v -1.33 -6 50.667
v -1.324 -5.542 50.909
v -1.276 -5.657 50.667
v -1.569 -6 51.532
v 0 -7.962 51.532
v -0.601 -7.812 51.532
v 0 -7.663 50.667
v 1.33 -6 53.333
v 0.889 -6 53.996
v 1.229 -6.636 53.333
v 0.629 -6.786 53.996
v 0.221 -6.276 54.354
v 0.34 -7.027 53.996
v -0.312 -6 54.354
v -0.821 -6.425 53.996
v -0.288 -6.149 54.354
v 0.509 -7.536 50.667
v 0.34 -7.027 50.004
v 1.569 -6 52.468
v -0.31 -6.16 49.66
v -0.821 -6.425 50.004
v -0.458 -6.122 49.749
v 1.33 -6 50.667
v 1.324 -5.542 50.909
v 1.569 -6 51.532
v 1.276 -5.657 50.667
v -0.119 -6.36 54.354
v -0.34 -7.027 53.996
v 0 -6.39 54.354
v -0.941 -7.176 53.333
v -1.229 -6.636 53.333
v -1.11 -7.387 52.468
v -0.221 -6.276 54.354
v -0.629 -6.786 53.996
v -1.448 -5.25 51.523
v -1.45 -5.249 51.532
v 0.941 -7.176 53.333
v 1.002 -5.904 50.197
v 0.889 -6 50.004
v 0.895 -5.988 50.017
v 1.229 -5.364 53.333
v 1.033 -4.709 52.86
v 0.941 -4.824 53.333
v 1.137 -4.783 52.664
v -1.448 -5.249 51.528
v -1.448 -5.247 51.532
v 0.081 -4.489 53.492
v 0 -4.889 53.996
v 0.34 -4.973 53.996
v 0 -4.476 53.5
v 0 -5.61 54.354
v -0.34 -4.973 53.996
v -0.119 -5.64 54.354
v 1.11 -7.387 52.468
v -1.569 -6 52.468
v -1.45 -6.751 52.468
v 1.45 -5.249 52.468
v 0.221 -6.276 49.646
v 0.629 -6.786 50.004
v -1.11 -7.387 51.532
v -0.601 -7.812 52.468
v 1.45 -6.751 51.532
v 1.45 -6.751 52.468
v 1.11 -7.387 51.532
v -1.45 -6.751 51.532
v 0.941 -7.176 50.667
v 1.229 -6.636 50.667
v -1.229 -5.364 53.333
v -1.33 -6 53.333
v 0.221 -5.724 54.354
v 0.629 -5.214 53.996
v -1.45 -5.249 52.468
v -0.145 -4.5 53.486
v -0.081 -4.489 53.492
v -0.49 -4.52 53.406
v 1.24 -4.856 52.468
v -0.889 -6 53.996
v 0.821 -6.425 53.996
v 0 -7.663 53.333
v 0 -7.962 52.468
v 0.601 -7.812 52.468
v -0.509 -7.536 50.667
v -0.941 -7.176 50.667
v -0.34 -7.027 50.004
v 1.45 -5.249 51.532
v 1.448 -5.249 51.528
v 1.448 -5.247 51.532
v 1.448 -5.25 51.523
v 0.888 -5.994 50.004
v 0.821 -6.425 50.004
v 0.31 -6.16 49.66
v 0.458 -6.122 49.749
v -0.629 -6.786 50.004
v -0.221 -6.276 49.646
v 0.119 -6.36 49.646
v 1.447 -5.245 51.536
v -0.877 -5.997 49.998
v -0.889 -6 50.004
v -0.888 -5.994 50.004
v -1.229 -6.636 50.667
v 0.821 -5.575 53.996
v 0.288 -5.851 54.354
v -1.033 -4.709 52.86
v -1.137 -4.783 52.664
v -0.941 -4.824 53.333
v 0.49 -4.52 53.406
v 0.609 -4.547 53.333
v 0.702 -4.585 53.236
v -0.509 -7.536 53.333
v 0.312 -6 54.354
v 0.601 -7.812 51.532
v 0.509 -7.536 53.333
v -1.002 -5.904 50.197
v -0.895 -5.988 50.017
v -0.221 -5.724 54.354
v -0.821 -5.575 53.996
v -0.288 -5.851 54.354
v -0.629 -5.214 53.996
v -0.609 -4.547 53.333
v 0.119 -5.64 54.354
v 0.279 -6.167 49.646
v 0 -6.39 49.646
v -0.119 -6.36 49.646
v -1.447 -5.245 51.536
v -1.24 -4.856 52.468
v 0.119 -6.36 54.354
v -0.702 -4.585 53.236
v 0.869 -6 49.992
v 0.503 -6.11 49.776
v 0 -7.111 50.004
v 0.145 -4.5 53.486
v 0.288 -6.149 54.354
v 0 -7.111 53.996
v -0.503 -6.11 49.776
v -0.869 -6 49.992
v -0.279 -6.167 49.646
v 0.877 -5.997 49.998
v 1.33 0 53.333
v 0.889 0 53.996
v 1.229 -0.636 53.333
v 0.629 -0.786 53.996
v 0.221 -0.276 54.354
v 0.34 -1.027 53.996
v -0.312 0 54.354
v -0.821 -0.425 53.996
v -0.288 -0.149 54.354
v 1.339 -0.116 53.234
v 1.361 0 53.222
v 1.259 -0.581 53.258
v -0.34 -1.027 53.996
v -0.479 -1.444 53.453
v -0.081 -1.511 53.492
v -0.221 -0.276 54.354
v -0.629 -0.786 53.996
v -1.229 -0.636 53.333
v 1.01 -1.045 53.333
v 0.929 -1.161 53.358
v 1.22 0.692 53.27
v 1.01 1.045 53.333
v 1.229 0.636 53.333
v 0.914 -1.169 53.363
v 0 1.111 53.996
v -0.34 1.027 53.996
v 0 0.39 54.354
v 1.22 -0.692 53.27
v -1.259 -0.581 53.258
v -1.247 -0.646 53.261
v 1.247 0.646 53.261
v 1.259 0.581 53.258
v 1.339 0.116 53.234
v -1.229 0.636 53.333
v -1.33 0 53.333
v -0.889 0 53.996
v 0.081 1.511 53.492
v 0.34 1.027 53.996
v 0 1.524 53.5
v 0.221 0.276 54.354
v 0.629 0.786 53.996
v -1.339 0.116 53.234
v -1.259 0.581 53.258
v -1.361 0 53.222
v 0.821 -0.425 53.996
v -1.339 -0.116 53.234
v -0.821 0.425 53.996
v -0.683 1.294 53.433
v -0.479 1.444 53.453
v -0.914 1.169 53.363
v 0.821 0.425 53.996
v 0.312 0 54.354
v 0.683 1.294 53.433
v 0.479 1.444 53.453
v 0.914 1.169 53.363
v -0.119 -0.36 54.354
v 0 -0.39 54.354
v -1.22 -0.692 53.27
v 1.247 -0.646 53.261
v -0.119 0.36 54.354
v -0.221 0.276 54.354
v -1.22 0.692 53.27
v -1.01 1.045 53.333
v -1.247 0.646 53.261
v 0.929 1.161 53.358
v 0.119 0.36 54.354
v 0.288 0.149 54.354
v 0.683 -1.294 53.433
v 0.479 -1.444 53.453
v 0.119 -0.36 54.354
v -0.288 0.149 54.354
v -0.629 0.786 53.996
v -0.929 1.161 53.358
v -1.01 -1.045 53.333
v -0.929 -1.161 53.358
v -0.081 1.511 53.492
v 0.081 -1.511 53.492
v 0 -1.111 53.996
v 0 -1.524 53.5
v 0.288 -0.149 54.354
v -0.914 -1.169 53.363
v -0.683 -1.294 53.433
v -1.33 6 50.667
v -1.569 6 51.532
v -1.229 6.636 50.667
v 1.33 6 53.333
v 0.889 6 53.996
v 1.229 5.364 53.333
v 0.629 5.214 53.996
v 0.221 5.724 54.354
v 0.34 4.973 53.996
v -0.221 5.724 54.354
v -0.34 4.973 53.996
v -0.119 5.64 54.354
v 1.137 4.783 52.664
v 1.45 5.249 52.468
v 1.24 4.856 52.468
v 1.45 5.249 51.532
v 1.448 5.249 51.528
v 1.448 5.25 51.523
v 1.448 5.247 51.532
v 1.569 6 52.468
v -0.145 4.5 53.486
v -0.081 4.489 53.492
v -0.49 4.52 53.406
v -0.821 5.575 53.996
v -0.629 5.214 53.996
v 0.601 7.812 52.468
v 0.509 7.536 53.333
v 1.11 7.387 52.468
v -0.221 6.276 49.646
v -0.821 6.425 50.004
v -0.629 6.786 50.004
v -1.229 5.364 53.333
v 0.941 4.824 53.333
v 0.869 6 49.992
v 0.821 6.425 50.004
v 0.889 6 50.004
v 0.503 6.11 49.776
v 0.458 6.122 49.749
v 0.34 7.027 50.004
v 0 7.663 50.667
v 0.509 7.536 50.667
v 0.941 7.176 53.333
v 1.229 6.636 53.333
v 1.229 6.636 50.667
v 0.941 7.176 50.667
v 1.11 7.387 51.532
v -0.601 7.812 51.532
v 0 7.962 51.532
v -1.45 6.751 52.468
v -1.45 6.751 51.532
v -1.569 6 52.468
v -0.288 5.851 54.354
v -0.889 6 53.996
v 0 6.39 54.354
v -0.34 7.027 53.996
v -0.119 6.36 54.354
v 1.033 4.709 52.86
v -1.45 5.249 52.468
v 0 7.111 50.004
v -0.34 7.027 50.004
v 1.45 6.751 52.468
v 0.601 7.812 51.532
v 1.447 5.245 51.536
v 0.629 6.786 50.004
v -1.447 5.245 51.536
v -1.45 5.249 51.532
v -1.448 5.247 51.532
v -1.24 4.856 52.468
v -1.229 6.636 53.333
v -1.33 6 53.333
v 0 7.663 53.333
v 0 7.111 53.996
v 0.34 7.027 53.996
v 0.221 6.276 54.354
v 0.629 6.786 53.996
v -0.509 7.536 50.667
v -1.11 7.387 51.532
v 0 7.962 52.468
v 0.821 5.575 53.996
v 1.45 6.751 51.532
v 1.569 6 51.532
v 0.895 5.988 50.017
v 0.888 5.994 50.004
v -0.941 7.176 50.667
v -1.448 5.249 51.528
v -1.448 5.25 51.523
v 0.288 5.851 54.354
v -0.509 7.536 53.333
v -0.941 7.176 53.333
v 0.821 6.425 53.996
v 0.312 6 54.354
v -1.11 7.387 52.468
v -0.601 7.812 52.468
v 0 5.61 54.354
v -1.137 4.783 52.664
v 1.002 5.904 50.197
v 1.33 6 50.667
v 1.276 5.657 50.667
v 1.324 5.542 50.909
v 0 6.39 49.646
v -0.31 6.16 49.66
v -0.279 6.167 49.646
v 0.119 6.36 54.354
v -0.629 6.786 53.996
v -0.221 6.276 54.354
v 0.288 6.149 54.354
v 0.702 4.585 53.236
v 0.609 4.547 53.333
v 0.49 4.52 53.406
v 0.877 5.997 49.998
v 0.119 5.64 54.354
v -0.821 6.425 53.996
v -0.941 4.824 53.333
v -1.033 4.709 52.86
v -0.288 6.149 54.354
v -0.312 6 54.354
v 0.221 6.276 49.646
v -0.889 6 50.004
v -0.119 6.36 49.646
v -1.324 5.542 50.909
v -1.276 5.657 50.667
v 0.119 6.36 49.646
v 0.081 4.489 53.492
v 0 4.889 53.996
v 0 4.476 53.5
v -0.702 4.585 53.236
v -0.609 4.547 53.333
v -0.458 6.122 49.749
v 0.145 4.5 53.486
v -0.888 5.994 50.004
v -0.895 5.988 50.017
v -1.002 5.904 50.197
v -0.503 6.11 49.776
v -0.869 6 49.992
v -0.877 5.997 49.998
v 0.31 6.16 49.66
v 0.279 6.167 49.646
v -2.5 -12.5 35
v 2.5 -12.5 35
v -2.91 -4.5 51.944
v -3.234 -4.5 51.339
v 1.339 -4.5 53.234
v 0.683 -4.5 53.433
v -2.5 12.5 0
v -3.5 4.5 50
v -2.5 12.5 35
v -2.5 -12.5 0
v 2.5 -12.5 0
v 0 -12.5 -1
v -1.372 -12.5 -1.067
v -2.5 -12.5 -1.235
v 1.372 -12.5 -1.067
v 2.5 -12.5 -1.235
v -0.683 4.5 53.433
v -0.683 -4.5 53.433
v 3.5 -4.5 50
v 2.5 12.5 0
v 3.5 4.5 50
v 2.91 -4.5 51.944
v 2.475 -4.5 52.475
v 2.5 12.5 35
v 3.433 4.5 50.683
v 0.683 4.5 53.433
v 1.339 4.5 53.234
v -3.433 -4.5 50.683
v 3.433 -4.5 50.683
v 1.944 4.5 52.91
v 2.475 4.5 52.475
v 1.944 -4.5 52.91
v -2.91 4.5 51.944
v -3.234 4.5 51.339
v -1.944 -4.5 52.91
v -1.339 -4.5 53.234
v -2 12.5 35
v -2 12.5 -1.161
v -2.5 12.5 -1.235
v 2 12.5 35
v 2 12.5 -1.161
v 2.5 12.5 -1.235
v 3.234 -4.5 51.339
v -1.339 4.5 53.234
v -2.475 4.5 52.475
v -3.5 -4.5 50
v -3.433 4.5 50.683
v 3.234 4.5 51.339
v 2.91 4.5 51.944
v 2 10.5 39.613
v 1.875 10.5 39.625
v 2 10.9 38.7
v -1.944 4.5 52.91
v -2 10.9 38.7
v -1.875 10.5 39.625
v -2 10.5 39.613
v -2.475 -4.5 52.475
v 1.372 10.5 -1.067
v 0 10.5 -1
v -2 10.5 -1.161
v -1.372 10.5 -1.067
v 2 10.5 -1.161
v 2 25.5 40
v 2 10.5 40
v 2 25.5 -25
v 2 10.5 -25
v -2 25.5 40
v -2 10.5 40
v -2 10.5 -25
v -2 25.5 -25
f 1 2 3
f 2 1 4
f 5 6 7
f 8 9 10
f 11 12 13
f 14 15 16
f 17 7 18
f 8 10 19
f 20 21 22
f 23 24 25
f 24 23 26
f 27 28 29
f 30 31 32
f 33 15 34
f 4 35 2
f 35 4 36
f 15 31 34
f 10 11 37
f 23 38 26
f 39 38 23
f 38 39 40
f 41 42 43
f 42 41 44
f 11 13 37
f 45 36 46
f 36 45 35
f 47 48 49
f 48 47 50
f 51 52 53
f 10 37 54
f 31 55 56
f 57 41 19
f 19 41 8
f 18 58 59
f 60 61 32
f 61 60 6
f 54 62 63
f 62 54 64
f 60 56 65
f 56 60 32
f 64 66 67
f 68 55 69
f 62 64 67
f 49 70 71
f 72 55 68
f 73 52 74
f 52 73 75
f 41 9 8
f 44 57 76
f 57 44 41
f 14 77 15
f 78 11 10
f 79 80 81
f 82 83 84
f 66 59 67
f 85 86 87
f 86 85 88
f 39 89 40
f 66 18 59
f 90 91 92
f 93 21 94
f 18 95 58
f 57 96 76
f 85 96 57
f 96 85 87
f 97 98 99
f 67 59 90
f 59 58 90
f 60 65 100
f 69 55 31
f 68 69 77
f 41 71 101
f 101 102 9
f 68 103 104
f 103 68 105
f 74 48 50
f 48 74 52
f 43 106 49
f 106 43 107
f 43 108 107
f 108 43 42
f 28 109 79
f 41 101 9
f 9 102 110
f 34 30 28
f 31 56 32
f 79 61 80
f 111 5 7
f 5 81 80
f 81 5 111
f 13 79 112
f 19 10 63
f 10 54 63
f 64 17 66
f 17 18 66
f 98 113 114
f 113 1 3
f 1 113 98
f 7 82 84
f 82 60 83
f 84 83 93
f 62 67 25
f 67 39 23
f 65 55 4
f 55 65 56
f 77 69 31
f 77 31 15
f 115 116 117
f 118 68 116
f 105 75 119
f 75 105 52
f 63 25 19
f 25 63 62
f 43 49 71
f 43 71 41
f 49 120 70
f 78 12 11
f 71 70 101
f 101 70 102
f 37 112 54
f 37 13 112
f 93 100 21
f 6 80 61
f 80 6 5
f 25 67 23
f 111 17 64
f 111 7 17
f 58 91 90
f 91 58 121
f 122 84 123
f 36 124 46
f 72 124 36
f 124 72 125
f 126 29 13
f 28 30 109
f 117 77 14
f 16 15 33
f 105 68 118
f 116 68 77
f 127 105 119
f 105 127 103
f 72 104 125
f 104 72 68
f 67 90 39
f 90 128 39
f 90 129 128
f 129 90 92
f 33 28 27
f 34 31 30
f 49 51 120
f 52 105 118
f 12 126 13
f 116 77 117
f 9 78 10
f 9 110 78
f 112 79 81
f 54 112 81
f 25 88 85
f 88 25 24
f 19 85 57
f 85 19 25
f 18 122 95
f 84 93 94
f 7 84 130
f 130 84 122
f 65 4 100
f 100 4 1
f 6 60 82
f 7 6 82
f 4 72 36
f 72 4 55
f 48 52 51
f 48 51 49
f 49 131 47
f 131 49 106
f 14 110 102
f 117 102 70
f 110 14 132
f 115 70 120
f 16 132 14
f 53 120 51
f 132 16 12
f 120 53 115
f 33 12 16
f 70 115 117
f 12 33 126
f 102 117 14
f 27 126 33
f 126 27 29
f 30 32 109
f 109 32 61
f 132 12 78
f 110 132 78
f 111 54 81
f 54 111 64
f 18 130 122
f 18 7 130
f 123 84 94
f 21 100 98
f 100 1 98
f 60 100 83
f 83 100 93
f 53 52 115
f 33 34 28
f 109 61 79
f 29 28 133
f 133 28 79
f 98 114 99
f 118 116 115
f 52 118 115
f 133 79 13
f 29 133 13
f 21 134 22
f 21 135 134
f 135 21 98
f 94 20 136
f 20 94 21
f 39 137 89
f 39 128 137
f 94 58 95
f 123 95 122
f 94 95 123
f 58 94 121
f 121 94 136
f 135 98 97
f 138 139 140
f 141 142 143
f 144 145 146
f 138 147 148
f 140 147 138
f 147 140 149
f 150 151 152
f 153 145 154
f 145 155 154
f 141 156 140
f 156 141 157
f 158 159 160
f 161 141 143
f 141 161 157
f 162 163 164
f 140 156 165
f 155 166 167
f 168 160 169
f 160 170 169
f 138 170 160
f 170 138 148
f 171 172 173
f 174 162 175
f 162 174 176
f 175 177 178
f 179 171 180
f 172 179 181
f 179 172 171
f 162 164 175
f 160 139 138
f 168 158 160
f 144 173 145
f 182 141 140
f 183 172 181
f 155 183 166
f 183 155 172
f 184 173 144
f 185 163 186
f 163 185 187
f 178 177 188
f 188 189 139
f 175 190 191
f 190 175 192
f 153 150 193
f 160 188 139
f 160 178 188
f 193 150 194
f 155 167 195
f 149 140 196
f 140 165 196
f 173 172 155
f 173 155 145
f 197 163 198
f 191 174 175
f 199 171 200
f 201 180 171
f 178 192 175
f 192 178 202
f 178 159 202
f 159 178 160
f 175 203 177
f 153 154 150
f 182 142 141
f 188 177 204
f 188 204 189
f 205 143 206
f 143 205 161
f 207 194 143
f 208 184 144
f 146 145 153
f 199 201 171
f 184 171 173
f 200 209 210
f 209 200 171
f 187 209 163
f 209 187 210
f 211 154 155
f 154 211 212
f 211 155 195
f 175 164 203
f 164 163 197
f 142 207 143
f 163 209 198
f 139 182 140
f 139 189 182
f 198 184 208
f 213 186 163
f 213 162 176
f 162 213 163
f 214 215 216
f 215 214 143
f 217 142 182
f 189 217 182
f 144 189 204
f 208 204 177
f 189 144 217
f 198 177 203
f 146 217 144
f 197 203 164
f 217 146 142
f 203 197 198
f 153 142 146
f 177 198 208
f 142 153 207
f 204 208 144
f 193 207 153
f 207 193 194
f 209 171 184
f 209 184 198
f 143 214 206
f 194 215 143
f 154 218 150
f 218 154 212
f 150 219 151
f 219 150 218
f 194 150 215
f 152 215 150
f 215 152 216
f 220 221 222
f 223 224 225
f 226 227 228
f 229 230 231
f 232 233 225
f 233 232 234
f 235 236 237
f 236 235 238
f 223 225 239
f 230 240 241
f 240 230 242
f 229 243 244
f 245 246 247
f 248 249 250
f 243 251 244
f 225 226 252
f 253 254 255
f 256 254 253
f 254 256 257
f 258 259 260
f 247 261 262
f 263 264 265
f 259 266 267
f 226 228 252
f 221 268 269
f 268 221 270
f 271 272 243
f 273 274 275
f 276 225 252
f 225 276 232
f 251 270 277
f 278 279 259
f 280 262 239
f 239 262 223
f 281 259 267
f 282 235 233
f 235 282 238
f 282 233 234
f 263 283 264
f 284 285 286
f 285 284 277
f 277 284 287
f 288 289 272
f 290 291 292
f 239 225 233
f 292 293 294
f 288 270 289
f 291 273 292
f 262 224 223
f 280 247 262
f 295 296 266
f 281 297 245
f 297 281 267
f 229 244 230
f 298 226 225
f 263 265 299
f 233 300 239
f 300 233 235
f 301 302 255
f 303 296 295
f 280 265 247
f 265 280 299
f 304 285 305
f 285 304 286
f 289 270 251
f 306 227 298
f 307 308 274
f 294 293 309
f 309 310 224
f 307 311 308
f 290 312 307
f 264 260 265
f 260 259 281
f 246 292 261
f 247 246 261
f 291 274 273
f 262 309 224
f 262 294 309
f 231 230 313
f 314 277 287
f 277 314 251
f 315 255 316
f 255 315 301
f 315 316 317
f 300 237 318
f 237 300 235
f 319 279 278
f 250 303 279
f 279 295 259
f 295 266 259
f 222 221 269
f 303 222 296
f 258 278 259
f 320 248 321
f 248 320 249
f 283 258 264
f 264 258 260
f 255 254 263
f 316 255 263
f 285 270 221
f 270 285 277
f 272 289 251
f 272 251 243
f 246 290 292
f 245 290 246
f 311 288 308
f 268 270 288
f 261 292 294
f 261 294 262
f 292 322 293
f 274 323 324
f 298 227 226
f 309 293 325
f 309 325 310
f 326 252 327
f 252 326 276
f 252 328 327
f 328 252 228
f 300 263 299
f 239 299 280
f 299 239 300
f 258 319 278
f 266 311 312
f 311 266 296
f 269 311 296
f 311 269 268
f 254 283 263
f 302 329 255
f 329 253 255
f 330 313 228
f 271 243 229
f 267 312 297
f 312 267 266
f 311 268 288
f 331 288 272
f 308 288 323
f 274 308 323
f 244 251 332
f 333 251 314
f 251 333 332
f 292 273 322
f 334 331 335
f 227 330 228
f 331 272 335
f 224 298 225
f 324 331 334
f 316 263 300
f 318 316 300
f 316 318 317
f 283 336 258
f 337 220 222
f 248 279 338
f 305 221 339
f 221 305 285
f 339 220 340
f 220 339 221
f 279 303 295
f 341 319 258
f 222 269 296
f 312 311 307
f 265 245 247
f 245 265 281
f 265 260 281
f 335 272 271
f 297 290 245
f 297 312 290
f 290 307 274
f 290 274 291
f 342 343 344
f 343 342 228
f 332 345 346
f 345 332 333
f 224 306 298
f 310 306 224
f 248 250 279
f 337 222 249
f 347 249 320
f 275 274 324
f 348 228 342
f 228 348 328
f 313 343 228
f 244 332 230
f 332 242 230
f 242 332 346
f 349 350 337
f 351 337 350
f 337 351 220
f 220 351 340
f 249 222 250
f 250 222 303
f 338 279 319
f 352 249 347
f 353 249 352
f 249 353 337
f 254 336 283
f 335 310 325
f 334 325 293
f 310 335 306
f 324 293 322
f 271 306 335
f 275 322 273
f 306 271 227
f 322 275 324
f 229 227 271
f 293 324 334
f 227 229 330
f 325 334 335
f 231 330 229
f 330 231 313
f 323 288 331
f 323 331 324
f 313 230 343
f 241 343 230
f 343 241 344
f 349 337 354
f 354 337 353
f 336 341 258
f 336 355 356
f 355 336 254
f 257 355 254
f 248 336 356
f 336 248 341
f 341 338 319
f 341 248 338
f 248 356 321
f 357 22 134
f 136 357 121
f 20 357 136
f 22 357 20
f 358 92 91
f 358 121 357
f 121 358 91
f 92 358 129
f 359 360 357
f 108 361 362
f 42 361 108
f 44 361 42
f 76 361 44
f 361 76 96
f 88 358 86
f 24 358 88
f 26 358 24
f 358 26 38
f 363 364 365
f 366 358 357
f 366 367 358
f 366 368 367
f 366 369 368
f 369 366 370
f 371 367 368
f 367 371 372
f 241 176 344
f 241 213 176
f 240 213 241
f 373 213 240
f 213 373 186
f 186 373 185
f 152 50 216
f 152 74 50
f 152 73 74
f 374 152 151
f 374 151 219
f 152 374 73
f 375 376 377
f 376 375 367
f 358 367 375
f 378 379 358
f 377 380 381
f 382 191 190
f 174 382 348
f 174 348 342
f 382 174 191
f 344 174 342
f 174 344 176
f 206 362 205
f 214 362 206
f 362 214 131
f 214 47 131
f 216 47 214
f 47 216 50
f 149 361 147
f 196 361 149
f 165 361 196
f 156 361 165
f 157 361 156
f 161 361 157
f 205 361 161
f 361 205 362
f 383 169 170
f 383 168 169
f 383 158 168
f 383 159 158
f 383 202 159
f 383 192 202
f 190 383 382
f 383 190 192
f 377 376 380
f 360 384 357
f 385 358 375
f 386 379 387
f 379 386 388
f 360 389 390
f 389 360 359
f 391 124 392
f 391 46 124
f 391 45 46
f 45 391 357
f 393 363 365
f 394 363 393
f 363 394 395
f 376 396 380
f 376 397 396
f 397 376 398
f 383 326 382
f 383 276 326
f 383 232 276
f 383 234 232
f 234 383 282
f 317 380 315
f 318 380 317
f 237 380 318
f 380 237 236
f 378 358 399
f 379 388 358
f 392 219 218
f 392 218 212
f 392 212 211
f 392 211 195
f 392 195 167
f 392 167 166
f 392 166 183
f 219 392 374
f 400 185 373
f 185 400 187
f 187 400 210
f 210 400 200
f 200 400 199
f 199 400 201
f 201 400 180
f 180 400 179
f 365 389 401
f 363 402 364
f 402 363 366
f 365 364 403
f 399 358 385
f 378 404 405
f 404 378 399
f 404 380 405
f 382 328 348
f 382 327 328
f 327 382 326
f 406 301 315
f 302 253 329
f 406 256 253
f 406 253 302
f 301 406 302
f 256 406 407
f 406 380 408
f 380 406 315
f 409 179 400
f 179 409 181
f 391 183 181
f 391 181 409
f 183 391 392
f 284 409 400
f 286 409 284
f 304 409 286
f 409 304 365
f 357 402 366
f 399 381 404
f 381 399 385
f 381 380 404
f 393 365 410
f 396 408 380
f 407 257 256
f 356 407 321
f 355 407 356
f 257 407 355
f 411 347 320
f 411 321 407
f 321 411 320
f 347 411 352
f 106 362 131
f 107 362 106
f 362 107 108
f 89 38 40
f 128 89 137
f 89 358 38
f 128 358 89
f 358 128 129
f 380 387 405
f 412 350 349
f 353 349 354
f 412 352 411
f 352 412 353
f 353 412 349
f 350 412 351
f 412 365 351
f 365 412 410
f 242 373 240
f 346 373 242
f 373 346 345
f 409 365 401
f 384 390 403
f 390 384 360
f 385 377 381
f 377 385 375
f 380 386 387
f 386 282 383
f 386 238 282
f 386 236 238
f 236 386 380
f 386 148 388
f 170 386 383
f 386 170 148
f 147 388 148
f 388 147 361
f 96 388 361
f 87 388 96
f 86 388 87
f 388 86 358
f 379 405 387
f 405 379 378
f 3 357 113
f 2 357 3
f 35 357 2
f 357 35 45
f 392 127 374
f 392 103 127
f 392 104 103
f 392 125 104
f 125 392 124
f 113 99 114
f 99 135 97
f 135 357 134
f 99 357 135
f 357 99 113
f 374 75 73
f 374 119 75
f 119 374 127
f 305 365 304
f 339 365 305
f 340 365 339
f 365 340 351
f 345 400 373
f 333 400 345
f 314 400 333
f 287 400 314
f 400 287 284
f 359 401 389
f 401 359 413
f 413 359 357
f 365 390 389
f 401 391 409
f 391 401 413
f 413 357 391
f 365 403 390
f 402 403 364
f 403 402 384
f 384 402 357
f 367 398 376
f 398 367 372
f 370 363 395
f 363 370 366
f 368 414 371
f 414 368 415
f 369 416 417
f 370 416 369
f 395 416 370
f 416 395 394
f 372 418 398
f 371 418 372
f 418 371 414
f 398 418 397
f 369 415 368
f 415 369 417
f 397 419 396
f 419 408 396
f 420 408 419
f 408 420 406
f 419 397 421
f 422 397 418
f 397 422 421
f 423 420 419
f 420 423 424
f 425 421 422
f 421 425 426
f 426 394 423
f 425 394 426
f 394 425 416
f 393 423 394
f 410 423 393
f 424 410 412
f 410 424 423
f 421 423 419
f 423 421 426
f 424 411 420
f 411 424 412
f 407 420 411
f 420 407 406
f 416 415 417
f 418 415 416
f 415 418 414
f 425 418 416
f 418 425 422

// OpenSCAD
// file: common.scad
/*
 * WAVE OCEAN V10 - VERTICAL SLAT SYSTEM
 * COMMON PARAMETERS
 *
 * Three slat designs: Standard (A), Foam (B), Breaking Curl (C)
 * Structural backplate with vertical grooves
 * No front guide rails - clean viewer POV
 */

// ============================================
// PRINT TOLERANCES
// ============================================

TOL_CLEARANCE = 0.2;
TOL_SLIDING = 0.3;
TOL_PRESS_FIT = -0.15;

// ============================================
// HARDWARE
// ============================================

BEARING_608_ID = 8;
BEARING_608_OD = 22;
BEARING_608_H = 7;

SHAFT_DIA = 8;
SHAFT_LENGTH = 260;

M3_HOLE = 3.2;
M4_HOLE = 4.2;

// ============================================
// TWISTED CAM DIMENSIONS
// ============================================

CAM_LENGTH = 200;
CAM_CORE_RADIUS = 12;
CAM_RIDGE_HEIGHT = 12;           // Wave amplitude
CAM_MAX_RADIUS = CAM_CORE_RADIUS + CAM_RIDGE_HEIGHT;  // 24mm

HELIX_TURNS = 2;
HELIX_PITCH = CAM_LENGTH / HELIX_TURNS;

// ============================================
// SLAT COMMON DIMENSIONS
// ============================================

NUM_SLATS = 24;
SLAT_SPACING = CAM_LENGTH / NUM_SLATS;  // 8.33mm

SLAT_THICKNESS = 5;              // X dimension (along cam axis)
SLAT_DEPTH = 25;                 // Y dimension (into backplate)

// Individual slat heights (Z dimension)
SLAT_A_HEIGHT = 50;              // Standard
SLAT_B_HEIGHT = 55;              // Foam crest (taller)
SLAT_C_HEIGHT = 60;              // Breaking curl (tallest)

// Back tab dimensions (slides in backplate groove)
TAB_WIDTH = 4;
TAB_DEPTH = 15;                  // How deep into backplate
TAB_HEIGHT_EXTENSION = 25;       // Extra height for groove engagement

// Cam follower bottom
FOLLOWER_CURVE_RADIUS = CAM_CORE_RADIUS + 2;  // 14mm

// ============================================
// SLAT TYPE ASSIGNMENT
// Pattern: A=Standard, B=Foam, C=Breaking Curl
// C types placed at wave peak positions
// ============================================

// 0-indexed array: which type for each position
SLAT_TYPES = [
    "A", "B", "A", "A", "C",    // 0-4
    "A", "B", "A", "C", "A",    // 5-9
    "A", "B", "A", "C", "A",    // 10-14
    "B", "A", "A", "C", "A",    // 15-19
    "B", "A", "A", "B"          // 20-23
];

function slat_type(i) = SLAT_TYPES[i];

function slat_height(i) =
    let(t = slat_type(i))
    t == "A" ? SLAT_A_HEIGHT :
    t == "B" ? SLAT_B_HEIGHT :
    t == "C" ? SLAT_C_HEIGHT : SLAT_A_HEIGHT;

// ============================================
// BACKPLATE DIMENSIONS
// ============================================

BACKPLATE_WIDTH = CAM_LENGTH + 40;   // 240mm
BACKPLATE_HEIGHT = 100;               // Tall enough for wave travel + slats
BACKPLATE_THICKNESS = 20;             // Structural thickness

// Groove dimensions
GROOVE_WIDTH = TAB_WIDTH + TOL_SLIDING;  // 4.3mm
GROOVE_DEPTH = TAB_DEPTH + 2;            // 17mm into backplate
GROOVE_HEIGHT = CAM_RIDGE_HEIGHT * 2 + SLAT_C_HEIGHT + 20;  // Full travel range

// ============================================
// ASSEMBLY POSITIONS
// ============================================

BASE_THICKNESS = 5;

// Cam center height
CAM_CENTER_Z = 35;

// Backplate position (behind slats)
BACKPLATE_Y = SLAT_DEPTH / 2 + 5;     // 17.5mm behind center
BACKPLATE_Z = CAM_CENTER_Z - 10;       // Starts below cam center

// ============================================
// COLORS
// ============================================

C_SLAT_A = [0.15, 0.35, 0.65];        // Standard blue
C_SLAT_B = [0.2, 0.45, 0.75];         // Lighter blue (foam)
C_SLAT_C = [0.1, 0.3, 0.55];          // Darker blue (curl)
C_FOAM = [0.95, 0.97, 1.0];           // White foam
C_BACKPLATE = [0.25, 0.2, 0.15];      // Dark wood
C_CAM = [0.7, 0.55, 0.3];
C_SHAFT = [0.6, 0.6, 0.65];

// ============================================
// HELPER FUNCTIONS
// ============================================

function helix_phase(x) = ((x + CAM_LENGTH/2) / CAM_LENGTH) * 360 * HELIX_TURNS;

function ridge_height(x, theta) =
    let(phase = helix_phase(x) + theta)
    CAM_RIDGE_HEIGHT * max(0, cos(phase - 90));

function cam_radius(x, theta) = CAM_CORE_RADIUS + ridge_height(x, theta);

function slat_x(i) = i * SLAT_SPACING - CAM_LENGTH/2 + SLAT_SPACING/2;

function slat_z(i, theta) =
    let(x = slat_x(i))
    CAM_CENTER_Z + cam_radius(x, theta);

// ============================================
// QUALITY
// ============================================

$fn = 48;
// main file
/*
 * SLAT TYPE A - Standard Wave
 *
 * Quantity: 10x
 * Height: 50mm
 * Character: Rounded symmetric crest, subtle foam texture
 * Use: Most common, fills space between accent pieces
 *
 * Profile:
 *        ╭──╮
 *       ╱    ╲
 *      ╱      ╲
 *     │        │
 *     │   ▯    │ ← Back tab
 *     ╰────────╯ ← Curved cam follower
 */

include <common.scad>

$fn = 48;

// ============================================
// MAIN MODULE
// ============================================

module slat_type_A() {
    color(C_SLAT_A)
    union() {
        // Main wave body
        wave_body_A();

        // Back tab for groove
        back_tab();

        // Cam follower bottom
        cam_follower();
    }
}

// ============================================
// WAVE BODY - Standard rounded profile
// ============================================

module wave_body_A() {
    height = SLAT_A_HEIGHT;

    // Main body with rounded crest
    hull() {
        // Base
        translate([-SLAT_THICKNESS/2, -SLAT_DEPTH/2, 0])
            cube([SLAT_THICKNESS, SLAT_DEPTH, height - 15]);

        // Crest - symmetric rounded peak
        translate([0, 0, height])
        scale([1, 0.6, 1])
        rotate([90, 0, 0])
            cylinder(d = SLAT_THICKNESS + 2, h = SLAT_DEPTH * 0.6, center = true, $fn = 32);
    }

    // Subtle foam bumps on top
    foam_texture_A();
}

// ============================================
// FOAM TEXTURE - Subtle bumps
// ============================================

module foam_texture_A() {
    height = SLAT_A_HEIGHT;

    // Small bumps along crest
    for (y = [-6, 0, 6]) {
        translate([0, y, height + 2])
        scale([0.8, 1, 1.2])
            sphere(d = 4, $fn = 16);
    }
}

// ============================================
// BACK TAB - Slides in backplate groove
// ============================================

module back_tab() {
    // Tab extends from back of slat into backplate groove
    // Provides vertical guidance without front rails

    tab_start_z = -TAB_HEIGHT_EXTENSION;
    tab_end_z = SLAT_A_HEIGHT - 10;
    tab_total_height = tab_end_z - tab_start_z;

    translate([-TAB_WIDTH/2, SLAT_DEPTH/2 - 2, tab_start_z])
        cube([TAB_WIDTH, TAB_DEPTH, tab_total_height]);
}

// ============================================
// CAM FOLLOWER - Curved bottom
// ============================================

module cam_follower() {
    follower_height = 8;

    translate([0, 0, -follower_height])
    difference() {
        // Solid base
        translate([-SLAT_THICKNESS/2, -SLAT_DEPTH/2, 0])
            cube([SLAT_THICKNESS, SLAT_DEPTH, follower_height + 1]);

        // Concave curve to ride on cam
        translate([0, 0, -FOLLOWER_CURVE_RADIUS + follower_height - 1])
        rotate([90, 0, 0])
            cylinder(r = FOLLOWER_CURVE_RADIUS, h = SLAT_DEPTH + 2, center = true, $fn = 64);
    }
}

// ============================================
// RENDER
// ============================================

slat_type_A();

// Reference: cam surface
%translate([0, 0, -FOLLOWER_CURVE_RADIUS - 8])
rotate([90, 0, 0])
    cylinder(r = CAM_CORE_RADIUS, h = SLAT_DEPTH + 20, center = true, $fn = 32);

echo("=== SLAT TYPE A: Standard Wave ===");
echo(str("Height: ", SLAT_A_HEIGHT, "mm"));
echo(str("Thickness: ", SLAT_THICKNESS, "mm"));
echo("Print quantity: 10");
